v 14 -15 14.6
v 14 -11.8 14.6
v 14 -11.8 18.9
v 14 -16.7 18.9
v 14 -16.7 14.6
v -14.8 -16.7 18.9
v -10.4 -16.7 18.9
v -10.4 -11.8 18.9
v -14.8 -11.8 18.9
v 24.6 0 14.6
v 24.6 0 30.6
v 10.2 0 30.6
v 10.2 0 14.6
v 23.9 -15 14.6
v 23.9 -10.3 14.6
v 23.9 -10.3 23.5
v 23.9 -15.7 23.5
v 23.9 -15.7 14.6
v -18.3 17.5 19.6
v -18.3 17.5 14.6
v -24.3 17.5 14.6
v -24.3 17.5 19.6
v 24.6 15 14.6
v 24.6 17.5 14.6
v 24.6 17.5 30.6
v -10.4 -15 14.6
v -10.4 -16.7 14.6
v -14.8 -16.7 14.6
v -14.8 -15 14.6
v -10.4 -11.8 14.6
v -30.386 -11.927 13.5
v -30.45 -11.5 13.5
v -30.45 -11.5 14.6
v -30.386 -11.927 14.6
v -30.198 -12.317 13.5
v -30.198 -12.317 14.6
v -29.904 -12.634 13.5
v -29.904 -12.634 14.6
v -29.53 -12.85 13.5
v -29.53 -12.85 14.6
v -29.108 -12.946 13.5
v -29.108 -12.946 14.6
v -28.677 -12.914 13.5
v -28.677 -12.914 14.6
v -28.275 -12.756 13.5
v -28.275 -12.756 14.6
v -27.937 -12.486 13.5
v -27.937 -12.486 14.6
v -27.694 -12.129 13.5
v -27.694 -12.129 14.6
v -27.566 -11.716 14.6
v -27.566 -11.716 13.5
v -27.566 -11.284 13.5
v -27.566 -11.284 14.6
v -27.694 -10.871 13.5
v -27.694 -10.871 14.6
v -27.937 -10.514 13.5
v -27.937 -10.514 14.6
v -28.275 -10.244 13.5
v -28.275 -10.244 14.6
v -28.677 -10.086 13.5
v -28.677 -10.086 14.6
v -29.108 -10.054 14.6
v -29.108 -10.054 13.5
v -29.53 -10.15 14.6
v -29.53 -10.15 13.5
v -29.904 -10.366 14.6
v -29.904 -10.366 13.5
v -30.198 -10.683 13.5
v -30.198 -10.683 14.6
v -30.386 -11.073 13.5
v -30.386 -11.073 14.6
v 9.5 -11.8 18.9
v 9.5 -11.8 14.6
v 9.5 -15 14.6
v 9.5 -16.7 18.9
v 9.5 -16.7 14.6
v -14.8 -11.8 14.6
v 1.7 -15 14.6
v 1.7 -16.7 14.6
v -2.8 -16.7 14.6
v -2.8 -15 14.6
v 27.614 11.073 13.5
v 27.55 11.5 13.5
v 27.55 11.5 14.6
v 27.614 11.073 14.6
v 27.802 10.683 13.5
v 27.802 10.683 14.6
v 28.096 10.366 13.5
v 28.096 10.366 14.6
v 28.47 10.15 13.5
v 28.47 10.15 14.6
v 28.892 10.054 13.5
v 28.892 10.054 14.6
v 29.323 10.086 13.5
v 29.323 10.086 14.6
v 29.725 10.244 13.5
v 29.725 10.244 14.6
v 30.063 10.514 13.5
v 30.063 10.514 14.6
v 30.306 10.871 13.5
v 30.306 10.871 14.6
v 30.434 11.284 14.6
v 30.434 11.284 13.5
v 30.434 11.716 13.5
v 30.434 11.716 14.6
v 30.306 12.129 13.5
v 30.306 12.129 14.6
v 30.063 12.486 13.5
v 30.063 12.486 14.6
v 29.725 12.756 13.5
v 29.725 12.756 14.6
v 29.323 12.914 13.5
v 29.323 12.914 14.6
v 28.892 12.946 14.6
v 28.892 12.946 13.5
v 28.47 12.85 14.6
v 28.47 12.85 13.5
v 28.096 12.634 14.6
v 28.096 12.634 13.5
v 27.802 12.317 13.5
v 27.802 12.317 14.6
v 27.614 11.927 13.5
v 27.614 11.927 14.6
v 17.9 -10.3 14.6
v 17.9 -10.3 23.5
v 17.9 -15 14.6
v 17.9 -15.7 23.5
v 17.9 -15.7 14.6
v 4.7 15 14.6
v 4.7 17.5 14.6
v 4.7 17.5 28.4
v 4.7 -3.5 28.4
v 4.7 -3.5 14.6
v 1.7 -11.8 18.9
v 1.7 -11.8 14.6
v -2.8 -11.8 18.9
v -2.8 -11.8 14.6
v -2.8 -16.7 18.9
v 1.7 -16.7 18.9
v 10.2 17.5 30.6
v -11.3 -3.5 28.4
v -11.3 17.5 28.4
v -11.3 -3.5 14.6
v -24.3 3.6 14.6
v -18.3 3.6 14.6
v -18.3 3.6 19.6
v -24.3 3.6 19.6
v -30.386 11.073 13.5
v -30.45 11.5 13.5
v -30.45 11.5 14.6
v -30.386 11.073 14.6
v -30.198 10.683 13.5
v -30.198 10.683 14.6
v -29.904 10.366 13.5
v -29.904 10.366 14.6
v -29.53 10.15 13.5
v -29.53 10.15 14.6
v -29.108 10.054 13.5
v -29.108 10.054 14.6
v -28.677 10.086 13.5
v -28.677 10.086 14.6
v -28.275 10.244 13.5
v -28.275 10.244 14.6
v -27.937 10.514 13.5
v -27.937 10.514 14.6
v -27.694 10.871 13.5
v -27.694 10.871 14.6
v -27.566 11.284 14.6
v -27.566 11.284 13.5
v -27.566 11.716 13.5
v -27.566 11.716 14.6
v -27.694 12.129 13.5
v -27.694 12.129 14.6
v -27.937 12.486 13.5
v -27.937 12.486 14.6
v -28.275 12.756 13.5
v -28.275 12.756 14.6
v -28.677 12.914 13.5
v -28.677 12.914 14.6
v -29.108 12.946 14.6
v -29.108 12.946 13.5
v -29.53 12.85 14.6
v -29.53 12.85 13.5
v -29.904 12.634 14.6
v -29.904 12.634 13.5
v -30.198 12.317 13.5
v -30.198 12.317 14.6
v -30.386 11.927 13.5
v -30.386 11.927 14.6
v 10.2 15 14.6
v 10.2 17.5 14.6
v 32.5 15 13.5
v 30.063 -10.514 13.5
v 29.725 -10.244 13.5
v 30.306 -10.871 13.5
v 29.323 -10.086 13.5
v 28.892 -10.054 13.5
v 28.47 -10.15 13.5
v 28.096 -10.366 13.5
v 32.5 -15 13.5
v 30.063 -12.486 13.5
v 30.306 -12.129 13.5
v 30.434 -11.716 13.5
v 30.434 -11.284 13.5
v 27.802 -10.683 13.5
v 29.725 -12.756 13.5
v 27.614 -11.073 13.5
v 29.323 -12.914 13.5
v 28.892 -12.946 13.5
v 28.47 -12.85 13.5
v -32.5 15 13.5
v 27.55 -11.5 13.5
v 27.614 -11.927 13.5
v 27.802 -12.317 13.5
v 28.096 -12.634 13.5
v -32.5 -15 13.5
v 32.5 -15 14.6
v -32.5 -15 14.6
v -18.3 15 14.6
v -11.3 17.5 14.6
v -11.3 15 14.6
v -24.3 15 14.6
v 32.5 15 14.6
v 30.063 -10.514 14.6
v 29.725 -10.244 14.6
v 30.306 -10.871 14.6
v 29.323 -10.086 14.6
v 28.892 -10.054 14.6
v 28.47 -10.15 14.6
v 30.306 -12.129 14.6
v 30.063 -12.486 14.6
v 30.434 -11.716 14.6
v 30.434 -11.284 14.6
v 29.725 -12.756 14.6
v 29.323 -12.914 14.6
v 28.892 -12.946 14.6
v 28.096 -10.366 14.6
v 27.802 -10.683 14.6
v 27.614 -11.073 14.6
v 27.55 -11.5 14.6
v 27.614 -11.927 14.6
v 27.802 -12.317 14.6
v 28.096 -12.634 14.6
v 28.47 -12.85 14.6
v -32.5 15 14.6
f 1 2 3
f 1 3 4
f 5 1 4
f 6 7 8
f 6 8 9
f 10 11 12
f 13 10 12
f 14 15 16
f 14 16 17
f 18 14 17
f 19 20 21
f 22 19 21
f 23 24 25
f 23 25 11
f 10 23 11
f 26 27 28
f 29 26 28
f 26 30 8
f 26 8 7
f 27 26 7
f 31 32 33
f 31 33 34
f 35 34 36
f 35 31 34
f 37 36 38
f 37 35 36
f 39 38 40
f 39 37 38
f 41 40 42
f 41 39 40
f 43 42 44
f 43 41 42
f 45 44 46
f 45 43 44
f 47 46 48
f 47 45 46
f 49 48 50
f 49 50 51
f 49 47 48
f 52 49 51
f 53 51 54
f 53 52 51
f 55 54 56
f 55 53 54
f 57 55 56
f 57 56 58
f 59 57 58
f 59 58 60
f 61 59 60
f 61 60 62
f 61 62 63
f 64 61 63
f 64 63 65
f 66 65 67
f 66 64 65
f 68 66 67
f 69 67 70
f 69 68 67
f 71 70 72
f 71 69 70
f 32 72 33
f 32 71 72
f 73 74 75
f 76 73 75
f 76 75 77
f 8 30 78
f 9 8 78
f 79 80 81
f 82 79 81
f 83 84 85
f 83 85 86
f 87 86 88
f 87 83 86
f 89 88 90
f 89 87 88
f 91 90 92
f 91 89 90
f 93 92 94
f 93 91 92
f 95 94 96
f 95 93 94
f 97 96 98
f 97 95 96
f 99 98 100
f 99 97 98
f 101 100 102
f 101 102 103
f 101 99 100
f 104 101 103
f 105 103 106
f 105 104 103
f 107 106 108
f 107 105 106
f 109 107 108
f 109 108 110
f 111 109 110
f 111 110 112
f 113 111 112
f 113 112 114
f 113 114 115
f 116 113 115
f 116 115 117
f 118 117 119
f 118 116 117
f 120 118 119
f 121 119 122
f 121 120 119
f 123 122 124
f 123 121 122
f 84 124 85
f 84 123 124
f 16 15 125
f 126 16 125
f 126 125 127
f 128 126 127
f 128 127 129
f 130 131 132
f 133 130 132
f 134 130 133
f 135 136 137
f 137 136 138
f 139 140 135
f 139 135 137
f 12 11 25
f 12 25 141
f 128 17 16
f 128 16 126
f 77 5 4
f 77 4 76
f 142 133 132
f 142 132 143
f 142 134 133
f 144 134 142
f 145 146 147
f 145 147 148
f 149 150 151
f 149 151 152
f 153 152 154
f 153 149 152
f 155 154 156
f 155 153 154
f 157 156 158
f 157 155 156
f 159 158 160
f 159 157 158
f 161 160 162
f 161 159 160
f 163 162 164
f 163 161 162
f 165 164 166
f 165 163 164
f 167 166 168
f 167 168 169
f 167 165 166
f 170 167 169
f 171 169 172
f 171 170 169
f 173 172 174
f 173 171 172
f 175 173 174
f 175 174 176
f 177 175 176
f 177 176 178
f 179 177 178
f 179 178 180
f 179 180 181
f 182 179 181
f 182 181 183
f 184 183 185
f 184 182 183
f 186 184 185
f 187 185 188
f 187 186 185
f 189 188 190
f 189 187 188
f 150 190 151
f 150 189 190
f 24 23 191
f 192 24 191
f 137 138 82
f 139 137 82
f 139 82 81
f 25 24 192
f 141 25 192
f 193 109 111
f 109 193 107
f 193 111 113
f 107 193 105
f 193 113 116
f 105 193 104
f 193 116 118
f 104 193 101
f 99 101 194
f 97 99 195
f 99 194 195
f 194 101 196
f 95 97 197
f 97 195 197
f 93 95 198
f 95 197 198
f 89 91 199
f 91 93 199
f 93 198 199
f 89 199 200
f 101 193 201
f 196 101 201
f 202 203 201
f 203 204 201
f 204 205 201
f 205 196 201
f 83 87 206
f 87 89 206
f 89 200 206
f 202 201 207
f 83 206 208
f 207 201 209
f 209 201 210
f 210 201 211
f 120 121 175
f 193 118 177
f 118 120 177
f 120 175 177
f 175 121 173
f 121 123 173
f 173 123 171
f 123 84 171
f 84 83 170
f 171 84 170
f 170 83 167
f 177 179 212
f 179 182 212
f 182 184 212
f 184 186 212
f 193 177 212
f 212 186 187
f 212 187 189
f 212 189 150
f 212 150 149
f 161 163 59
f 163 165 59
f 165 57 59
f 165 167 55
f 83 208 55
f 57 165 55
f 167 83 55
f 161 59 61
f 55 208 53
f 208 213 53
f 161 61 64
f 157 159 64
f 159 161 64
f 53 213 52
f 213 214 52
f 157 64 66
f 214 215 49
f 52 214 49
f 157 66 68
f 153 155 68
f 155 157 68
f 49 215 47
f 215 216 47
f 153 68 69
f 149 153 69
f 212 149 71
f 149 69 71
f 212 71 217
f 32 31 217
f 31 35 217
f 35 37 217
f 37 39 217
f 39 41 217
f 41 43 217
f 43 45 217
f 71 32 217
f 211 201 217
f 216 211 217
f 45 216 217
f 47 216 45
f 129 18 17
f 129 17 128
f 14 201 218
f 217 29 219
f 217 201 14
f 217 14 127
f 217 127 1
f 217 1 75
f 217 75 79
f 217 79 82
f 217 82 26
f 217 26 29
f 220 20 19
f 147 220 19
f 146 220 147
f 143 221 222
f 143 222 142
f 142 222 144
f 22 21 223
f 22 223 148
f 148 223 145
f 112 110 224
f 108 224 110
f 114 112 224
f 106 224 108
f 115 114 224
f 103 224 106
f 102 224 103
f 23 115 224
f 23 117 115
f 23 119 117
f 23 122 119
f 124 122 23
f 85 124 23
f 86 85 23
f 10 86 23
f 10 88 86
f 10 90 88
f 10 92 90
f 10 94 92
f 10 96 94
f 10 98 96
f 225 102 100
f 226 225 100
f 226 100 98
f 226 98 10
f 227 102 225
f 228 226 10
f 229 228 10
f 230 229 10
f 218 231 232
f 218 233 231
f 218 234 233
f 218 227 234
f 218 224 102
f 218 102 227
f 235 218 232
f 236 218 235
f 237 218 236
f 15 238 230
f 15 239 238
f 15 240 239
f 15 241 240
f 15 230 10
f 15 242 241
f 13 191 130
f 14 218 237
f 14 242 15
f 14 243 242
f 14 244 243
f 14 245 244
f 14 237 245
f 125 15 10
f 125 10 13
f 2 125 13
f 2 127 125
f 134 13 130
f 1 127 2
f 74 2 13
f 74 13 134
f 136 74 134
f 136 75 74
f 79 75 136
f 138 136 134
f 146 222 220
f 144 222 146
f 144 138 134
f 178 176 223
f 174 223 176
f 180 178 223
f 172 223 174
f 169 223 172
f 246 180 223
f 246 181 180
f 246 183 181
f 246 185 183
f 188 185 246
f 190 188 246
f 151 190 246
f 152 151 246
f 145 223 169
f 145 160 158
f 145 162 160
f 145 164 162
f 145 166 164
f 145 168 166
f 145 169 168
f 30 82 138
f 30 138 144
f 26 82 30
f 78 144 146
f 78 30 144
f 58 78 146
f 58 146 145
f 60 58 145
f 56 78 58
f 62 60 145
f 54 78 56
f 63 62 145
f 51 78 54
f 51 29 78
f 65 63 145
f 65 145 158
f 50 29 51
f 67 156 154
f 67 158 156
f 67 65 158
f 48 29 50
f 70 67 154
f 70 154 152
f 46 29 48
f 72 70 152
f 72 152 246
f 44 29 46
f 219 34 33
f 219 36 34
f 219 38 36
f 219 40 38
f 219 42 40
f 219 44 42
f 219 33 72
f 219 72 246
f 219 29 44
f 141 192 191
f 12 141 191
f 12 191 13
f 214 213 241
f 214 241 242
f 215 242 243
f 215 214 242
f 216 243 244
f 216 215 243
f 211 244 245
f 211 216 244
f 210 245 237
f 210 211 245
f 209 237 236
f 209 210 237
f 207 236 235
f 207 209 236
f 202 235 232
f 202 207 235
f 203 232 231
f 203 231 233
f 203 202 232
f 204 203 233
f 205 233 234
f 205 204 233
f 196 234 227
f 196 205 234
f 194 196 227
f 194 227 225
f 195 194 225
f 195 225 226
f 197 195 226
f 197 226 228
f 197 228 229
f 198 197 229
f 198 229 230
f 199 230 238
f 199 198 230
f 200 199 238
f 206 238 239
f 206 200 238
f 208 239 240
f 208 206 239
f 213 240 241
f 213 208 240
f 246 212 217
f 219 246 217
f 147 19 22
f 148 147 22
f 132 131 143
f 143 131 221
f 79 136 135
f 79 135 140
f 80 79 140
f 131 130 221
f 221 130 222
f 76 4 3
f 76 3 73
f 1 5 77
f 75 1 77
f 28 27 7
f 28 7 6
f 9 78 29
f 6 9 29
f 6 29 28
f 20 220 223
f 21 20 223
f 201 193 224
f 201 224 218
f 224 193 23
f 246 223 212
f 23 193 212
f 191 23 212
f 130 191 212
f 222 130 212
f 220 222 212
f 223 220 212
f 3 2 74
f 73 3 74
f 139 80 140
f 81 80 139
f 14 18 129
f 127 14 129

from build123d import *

# Parameters (mm, degrees)
SKETCH040_W             = 65
SKETCH040_H             = 30
SKETCH040_R             = 1.45
PAD013_DEPTH            = 1.1
SKETCH042_W             = 14.4
SKETCH042_H             = 17.5
PAD014_DEPTH            = 16
SKETCH043_W             = 16
SKETCH043_H             = 21
PAD015_DEPTH            = 13.8
SKETCH044_W             = 6
SKETCH044_H             = 13.9
PAD016_DEPTH            = 5
SKETCH045_W             = 4.4
SKETCH045_H             = 4.9
SKETCH045_W_2           = 4.5
PAD017_DEPTH            = 4.3
SKETCH046_W             = 6
SKETCH046_H             = 5.4
PAD018_DEPTH            = 8.9
BODY004_PLACEMENT_ANGLE = 180


with BuildPart() as part:
    # Sketch040 → Pad013 (new body)
    with BuildSketch(Plane.XY):
        Rectangle(SKETCH040_W, SKETCH040_H)
        with Locations((-29, 11.5)):
            Circle(SKETCH040_R, mode=Mode.SUBTRACT)
        with Locations((29, 11.5)):
            Circle(SKETCH040_R, mode=Mode.SUBTRACT)
        with Locations((29, -11.5)):
            Circle(SKETCH040_R, mode=Mode.SUBTRACT)
        with Locations((-29, -11.5)):
            Circle(SKETCH040_R, mode=Mode.SUBTRACT)
    extrude(amount=PAD013_DEPTH)

    # Sketch042 (on Face10 of Pad013) → Pad014 (join)
    with BuildSketch(Plane.XY.offset(1.1)):
        with Locations((-17.4, -8.75)):
            Rectangle(SKETCH042_W, SKETCH042_H)
    extrude(amount=PAD014_DEPTH)

    # Sketch043 (on Face5 of Pad014) → Pad015 (join)
    with BuildSketch(Plane.XY.offset(1.1)):
        with Locations((3.3, -7)):
            Rectangle(SKETCH043_W, SKETCH043_H)
    extrude(amount=PAD015_DEPTH)

    # Sketch044 (on Face5 of Pad015) → Pad016 (join)
    with BuildSketch(Plane.XY.offset(1.1)):
        with Locations((21.3, -10.55)):
            Rectangle(SKETCH044_W, SKETCH044_H)
    extrude(amount=PAD016_DEPTH)

    # Sketch045 (on Face5 of Pad016) → Pad017 (join)
    with BuildSketch(Plane.XY.offset(1.1)):
        with Locations((12.6, 14.25)):
            Rectangle(SKETCH045_W, SKETCH045_H)
        with Locations((0.55, 14.25)):
            Rectangle(SKETCH045_W_2, SKETCH045_H)
        with Locations((-11.75, 14.25)):
            Rectangle(SKETCH045_W_2, SKETCH045_H)
    extrude(amount=PAD017_DEPTH)

    # Sketch046 (on Face5 of Pad017) → Pad018 (join)
    with BuildSketch(Plane.XY.offset(1.1)):
        with Locations((-20.9, 13)):
            Rectangle(SKETCH046_W, SKETCH046_H)
    extrude(amount=PAD018_DEPTH)


with BuildPart() as part_1:
    # Body004 placement: moved
    add(part.part.moved(Location((0, 0, 13.5))).rotate(Axis((0, 0, 13.5), (0, 0, 1)), BODY004_PLACEMENT_ANGLE))


solid = part_1.part
